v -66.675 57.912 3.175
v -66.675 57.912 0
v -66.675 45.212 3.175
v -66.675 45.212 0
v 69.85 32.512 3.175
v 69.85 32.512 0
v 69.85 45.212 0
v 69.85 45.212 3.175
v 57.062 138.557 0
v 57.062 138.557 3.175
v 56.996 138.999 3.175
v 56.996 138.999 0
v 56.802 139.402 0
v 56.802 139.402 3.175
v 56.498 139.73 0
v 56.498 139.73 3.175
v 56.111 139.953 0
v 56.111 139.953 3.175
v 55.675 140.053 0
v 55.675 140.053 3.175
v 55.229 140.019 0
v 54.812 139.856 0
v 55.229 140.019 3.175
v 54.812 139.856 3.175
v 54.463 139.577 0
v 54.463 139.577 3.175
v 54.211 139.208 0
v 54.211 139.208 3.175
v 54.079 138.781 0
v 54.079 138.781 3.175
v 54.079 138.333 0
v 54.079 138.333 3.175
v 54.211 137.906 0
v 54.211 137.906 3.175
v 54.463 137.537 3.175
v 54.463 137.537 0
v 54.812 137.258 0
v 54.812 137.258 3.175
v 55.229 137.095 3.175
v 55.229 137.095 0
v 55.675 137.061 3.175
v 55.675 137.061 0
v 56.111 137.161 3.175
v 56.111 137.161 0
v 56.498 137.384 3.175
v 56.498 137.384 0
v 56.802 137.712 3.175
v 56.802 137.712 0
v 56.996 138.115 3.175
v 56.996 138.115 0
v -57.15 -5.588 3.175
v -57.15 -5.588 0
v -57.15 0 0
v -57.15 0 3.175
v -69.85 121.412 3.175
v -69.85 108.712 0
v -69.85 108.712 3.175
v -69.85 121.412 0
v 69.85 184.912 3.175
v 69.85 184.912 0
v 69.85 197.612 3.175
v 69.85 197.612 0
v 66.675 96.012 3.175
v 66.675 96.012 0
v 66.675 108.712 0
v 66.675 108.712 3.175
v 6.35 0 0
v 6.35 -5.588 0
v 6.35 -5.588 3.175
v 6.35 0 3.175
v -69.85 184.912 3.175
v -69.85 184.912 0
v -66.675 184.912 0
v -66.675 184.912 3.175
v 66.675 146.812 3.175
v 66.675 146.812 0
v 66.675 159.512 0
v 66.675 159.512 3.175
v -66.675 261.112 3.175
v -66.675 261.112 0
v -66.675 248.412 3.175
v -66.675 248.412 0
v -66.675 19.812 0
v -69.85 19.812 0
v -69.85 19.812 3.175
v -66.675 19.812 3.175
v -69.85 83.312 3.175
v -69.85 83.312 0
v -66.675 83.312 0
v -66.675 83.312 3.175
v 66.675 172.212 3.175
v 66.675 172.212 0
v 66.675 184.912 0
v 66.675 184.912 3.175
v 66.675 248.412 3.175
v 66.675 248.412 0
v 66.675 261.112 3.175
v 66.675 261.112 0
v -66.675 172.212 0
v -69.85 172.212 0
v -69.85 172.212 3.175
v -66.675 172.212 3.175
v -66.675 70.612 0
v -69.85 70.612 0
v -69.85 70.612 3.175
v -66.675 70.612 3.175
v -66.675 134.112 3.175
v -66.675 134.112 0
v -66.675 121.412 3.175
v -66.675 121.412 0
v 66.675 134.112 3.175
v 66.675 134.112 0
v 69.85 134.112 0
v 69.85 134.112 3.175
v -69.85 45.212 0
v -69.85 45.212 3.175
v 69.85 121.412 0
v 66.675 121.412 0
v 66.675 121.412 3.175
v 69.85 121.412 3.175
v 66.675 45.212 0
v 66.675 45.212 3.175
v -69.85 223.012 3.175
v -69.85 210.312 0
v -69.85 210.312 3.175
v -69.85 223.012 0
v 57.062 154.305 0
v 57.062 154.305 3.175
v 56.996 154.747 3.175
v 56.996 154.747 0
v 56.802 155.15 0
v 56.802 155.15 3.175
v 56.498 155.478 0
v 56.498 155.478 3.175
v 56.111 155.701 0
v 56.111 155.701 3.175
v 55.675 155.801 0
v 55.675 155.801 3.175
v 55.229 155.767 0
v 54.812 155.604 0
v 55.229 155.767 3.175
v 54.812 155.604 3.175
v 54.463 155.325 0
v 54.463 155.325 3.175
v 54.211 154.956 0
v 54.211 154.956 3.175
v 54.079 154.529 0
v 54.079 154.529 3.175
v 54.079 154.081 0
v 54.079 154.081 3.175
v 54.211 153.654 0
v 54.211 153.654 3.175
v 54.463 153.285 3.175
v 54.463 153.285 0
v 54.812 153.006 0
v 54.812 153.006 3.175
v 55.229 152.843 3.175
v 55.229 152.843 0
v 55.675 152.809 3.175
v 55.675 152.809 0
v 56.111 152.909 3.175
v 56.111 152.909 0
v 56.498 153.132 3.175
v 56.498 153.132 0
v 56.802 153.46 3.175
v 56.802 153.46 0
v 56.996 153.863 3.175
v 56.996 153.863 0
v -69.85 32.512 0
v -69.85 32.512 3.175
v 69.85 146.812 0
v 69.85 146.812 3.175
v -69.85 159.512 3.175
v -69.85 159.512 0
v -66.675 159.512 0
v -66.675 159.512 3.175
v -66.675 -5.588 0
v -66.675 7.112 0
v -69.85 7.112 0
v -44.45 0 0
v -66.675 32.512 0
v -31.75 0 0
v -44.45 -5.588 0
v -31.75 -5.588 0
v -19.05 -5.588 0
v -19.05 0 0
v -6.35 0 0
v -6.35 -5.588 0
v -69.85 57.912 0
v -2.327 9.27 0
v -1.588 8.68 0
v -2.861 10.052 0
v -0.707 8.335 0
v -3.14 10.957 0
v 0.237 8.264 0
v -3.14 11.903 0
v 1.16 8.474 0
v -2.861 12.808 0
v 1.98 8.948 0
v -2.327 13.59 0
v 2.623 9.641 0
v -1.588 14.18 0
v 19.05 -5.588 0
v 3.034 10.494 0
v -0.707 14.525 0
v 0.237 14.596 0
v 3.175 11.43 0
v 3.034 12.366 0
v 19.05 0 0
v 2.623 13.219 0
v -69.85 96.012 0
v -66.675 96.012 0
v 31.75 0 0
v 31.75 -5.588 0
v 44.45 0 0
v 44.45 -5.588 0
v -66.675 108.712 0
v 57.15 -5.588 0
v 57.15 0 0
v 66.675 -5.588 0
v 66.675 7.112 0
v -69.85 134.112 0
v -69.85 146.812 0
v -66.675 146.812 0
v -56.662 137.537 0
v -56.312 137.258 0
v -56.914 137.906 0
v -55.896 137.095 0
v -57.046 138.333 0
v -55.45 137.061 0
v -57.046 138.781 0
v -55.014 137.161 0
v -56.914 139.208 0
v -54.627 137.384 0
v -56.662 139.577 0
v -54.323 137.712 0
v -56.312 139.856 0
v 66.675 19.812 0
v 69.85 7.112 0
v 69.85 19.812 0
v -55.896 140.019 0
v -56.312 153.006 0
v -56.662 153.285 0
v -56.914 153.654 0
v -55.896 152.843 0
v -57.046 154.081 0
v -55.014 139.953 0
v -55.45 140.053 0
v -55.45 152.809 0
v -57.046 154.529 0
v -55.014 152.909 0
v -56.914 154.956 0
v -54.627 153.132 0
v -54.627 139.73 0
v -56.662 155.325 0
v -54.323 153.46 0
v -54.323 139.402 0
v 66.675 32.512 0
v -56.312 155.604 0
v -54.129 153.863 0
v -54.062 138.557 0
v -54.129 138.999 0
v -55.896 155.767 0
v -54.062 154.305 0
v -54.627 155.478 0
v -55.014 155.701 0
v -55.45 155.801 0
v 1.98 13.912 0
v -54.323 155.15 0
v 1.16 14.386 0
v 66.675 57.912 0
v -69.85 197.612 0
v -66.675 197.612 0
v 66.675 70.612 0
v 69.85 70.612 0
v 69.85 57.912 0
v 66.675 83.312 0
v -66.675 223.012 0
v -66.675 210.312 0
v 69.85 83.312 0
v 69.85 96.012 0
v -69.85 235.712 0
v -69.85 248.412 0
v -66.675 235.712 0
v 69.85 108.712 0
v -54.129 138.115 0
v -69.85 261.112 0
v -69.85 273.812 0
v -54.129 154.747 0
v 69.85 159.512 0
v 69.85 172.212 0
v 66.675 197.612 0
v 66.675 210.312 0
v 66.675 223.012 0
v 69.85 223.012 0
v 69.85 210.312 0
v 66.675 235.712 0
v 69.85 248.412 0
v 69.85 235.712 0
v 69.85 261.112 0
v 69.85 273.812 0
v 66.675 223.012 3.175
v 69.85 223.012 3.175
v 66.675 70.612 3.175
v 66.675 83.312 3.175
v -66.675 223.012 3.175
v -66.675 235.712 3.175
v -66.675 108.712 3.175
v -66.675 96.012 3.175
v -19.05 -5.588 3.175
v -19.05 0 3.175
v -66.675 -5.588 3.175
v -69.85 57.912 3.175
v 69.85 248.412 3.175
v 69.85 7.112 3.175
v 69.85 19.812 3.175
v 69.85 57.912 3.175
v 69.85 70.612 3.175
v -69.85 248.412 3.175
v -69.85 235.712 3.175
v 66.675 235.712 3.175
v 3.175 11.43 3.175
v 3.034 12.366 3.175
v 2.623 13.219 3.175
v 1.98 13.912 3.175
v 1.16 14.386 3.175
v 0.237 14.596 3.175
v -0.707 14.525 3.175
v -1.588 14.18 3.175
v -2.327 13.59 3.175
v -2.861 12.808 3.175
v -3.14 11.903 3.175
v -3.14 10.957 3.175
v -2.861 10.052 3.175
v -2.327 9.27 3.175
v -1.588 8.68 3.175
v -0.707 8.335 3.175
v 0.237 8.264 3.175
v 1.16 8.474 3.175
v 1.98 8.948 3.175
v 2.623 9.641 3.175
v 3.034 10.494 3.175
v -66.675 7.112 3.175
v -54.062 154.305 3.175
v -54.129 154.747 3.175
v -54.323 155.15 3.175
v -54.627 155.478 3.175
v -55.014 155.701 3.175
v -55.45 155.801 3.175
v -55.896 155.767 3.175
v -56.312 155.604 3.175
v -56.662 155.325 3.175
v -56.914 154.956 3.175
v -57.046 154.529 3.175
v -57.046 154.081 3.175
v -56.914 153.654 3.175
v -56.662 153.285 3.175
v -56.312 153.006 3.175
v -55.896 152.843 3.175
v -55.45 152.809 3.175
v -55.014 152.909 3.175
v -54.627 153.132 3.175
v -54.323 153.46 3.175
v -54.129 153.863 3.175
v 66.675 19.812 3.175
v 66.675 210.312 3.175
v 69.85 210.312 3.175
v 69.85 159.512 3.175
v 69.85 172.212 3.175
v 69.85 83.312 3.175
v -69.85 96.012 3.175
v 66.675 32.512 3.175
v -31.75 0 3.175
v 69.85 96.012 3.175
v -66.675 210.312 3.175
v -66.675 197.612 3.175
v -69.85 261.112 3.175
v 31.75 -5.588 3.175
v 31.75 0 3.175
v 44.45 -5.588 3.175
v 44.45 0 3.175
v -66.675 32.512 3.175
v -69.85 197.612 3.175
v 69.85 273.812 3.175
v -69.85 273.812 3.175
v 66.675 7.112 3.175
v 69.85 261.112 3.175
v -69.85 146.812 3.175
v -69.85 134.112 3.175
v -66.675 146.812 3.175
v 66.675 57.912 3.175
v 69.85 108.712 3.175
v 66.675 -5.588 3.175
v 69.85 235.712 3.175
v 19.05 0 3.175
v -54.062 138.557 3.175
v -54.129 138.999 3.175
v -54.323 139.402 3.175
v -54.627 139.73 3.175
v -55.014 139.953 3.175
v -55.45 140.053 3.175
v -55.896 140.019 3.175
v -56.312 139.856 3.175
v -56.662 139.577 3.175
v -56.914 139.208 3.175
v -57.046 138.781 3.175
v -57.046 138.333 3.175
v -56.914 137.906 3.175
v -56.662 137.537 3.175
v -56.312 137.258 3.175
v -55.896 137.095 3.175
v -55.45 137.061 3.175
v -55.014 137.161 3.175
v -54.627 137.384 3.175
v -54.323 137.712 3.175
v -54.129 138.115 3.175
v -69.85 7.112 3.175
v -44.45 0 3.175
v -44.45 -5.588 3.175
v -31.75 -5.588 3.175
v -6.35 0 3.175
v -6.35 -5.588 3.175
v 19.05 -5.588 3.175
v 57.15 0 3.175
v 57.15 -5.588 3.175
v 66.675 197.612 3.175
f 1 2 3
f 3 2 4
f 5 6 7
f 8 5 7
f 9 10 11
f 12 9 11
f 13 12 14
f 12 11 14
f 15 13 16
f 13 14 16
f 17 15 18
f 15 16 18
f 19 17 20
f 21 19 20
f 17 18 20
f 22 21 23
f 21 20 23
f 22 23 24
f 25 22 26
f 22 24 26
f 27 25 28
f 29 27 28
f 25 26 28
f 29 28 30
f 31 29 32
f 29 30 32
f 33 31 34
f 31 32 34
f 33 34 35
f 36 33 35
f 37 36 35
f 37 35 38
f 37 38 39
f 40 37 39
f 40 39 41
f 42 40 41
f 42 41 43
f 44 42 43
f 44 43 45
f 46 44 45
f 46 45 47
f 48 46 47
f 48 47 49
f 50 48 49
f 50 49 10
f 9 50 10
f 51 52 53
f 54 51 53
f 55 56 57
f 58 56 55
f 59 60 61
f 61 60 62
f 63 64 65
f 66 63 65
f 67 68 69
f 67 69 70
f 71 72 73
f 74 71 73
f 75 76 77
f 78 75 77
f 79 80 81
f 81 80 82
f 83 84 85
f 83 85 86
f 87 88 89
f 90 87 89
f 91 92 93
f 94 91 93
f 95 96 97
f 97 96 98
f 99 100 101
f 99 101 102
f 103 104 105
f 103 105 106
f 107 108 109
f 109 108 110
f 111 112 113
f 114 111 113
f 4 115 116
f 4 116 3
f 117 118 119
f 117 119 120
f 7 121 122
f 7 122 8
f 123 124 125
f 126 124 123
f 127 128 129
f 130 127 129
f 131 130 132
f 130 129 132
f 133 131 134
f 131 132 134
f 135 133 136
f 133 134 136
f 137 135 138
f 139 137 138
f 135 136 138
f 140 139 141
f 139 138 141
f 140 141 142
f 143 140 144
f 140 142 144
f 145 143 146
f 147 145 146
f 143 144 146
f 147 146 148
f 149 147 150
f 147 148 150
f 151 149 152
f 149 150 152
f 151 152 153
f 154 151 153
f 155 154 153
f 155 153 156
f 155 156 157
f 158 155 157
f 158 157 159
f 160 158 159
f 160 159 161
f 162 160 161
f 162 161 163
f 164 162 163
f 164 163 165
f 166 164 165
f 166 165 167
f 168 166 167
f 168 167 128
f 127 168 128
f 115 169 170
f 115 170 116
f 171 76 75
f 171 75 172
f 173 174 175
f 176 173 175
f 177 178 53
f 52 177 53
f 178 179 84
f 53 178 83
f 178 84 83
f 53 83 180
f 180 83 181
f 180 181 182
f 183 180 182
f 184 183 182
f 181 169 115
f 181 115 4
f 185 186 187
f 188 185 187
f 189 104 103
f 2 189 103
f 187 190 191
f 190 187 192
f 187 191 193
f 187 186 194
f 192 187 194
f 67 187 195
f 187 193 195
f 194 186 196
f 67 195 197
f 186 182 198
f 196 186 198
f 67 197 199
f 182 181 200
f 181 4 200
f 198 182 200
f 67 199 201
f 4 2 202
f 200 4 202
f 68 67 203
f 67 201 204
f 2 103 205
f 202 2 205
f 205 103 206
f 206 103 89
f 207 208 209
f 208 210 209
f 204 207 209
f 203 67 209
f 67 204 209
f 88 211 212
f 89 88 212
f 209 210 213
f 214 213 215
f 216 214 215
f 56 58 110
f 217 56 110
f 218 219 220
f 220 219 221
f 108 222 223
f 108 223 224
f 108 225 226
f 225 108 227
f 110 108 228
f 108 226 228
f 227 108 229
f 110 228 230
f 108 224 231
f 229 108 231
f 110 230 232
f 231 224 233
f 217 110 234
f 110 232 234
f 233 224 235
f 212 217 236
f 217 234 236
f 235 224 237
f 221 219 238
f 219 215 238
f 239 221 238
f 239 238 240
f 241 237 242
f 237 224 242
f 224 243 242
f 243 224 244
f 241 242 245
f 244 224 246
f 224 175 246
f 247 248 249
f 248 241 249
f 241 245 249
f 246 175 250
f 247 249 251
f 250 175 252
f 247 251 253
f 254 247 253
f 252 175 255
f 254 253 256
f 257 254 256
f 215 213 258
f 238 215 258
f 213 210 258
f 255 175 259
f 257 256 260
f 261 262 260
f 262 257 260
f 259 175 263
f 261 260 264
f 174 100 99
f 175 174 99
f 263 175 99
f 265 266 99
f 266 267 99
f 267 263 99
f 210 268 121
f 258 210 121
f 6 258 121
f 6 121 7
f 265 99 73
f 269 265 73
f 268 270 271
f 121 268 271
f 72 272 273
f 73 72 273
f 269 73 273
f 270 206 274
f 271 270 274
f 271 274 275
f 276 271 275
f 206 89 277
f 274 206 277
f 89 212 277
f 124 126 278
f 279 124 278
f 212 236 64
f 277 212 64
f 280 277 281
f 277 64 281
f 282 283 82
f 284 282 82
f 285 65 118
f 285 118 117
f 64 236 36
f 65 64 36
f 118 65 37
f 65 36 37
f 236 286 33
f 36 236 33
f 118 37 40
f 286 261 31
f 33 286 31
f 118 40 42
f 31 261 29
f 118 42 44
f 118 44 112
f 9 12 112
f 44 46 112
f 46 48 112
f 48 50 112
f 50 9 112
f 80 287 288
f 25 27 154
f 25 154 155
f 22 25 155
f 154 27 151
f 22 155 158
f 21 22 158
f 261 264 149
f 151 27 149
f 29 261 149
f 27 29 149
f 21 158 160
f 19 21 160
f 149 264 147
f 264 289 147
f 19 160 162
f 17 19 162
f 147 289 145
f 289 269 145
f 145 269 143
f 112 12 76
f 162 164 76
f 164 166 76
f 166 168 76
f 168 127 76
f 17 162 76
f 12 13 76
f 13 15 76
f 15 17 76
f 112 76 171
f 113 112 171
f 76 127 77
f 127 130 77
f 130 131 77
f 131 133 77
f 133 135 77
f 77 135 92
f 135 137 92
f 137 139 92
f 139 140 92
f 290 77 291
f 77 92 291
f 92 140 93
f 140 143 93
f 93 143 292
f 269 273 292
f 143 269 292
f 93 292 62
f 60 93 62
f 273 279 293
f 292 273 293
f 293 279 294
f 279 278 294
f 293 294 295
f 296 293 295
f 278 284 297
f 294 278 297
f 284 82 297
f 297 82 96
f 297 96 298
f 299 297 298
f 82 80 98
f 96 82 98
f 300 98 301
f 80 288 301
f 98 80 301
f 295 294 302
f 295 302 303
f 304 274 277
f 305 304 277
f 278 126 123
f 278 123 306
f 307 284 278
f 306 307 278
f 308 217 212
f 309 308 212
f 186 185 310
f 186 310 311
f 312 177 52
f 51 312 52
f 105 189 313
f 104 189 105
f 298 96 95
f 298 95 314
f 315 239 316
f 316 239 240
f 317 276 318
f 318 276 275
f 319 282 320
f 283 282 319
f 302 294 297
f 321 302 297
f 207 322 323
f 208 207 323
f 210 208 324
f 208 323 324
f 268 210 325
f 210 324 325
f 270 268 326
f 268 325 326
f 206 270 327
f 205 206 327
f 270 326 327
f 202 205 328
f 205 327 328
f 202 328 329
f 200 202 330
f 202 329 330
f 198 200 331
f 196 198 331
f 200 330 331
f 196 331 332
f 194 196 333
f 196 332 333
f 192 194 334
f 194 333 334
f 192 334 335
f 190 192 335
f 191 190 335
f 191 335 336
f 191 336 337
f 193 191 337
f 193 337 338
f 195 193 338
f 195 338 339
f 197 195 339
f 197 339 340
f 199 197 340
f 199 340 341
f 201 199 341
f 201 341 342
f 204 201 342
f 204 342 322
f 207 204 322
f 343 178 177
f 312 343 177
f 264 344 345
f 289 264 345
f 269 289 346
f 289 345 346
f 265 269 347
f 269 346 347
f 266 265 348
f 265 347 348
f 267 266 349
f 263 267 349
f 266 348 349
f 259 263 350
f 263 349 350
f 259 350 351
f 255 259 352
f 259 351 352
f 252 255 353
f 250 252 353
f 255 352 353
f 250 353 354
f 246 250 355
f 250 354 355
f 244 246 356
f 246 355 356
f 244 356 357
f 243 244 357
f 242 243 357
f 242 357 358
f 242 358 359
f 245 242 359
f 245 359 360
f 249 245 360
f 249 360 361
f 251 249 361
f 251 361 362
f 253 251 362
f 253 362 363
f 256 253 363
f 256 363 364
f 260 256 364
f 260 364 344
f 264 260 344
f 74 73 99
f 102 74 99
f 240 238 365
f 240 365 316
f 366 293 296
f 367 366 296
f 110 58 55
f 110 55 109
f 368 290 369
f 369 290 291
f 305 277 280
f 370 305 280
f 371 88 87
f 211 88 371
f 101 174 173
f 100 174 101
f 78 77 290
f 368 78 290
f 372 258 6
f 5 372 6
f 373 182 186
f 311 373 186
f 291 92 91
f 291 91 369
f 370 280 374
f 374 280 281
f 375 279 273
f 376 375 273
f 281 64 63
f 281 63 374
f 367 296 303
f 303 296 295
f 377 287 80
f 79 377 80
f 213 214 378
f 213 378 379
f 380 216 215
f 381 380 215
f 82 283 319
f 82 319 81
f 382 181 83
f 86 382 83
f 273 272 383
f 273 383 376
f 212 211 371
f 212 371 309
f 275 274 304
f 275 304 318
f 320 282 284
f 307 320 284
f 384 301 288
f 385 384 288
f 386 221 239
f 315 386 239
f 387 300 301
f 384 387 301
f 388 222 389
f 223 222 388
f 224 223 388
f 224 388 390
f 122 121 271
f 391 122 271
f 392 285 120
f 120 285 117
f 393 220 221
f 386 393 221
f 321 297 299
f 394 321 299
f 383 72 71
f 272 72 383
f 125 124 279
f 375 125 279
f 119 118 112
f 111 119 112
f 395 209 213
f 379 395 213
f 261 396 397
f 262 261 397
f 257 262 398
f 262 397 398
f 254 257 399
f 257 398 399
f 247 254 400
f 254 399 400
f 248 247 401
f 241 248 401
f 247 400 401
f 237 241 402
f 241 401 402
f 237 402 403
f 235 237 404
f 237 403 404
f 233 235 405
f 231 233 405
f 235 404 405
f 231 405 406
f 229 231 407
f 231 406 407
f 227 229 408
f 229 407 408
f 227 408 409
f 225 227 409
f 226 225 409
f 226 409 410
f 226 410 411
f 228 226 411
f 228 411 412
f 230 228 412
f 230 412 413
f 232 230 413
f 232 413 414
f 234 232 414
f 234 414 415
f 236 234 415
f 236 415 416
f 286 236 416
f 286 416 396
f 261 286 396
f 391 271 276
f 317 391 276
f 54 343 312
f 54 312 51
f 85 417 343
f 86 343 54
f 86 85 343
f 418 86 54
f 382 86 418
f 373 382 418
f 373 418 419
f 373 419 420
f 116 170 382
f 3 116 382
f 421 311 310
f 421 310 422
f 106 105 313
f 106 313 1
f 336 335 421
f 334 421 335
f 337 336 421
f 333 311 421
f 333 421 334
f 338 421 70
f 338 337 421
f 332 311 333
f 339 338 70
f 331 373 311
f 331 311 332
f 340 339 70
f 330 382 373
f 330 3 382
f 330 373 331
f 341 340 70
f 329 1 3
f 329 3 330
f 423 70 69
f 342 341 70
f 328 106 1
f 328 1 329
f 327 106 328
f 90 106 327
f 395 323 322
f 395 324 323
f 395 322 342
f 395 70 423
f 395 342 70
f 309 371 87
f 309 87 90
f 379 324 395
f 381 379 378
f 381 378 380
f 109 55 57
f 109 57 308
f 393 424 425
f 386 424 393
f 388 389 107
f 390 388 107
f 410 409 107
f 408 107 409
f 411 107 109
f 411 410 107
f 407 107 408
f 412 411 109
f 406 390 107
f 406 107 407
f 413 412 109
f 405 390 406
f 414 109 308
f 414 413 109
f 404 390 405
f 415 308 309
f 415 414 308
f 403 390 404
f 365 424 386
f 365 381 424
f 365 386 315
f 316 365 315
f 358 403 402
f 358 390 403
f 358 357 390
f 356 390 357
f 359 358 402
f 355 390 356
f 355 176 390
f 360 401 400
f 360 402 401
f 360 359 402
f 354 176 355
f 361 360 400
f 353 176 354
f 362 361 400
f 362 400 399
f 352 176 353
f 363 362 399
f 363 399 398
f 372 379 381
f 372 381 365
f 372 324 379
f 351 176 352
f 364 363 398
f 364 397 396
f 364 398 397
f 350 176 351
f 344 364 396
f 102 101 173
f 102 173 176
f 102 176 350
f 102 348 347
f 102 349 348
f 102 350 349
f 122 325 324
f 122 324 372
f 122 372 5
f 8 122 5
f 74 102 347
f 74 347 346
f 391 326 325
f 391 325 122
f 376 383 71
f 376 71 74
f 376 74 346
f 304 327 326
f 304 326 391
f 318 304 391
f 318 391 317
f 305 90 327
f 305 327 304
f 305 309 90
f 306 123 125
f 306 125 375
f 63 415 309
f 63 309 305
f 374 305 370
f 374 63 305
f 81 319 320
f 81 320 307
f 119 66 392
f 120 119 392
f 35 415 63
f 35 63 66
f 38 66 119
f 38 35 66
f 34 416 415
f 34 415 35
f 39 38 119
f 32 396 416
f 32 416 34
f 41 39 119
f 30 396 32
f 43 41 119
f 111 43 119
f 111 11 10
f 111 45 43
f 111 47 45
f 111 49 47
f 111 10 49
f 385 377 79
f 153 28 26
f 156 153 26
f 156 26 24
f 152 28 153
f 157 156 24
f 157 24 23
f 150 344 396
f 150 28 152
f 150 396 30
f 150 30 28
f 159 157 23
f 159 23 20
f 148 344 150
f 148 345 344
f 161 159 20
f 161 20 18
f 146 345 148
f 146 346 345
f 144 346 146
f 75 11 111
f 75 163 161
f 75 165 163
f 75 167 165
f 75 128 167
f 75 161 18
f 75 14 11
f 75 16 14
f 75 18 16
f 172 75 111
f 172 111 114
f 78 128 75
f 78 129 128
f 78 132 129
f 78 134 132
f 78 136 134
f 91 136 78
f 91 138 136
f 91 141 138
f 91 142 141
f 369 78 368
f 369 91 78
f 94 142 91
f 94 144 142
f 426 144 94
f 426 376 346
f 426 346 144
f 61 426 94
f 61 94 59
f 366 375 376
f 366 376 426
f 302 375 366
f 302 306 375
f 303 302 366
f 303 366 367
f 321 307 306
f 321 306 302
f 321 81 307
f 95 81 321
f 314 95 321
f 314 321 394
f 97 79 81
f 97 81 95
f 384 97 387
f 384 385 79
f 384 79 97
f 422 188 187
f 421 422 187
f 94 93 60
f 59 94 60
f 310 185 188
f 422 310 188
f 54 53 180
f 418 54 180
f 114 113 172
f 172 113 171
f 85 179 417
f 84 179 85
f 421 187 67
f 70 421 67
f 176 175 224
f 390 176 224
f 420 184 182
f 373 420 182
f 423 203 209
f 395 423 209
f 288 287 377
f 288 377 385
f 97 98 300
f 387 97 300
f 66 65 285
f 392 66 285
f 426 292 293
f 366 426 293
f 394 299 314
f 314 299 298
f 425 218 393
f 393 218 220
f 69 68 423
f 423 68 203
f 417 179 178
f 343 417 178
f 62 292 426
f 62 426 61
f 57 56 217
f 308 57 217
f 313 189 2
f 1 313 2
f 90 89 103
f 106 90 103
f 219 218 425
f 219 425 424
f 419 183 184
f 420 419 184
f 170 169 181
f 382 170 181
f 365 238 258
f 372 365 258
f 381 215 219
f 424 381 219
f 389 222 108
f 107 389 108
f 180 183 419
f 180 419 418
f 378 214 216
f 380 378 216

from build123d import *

# Parameters (mm, degrees)
SKETCH1_W           = 3.175
SKETCH1_H           = 12.7
SKETCH1_W_2         = 9.525
SKETCH1_H_2         = 5.588
SKETCH1_W_3         = 12.7
BOSS_EXTRUDE1_DEPTH = 3.175
SKETCH2_R           = 3.175
CUT_EXTRUDE1_DEPTH  = 4.175
SKETCH3_R           = 1.5
CUT_EXTRUDE2_DEPTH  = 4.175


with BuildPart() as part:
    # Sketch1 → Boss-Extrude1 (new body)
    with BuildSketch(Plane.XY):
        Polygon((-66.675, 273.812), (-66.675, 261.112), (-66.675, 248.412), (-66.675, 235.712), (-66.675, 223.012), (-66.675, 210.312), (-66.675, 197.612), (-66.675, 184.912), (-66.675, 172.212), (-66.675, 159.512), (-66.675, 146.812), (-66.675, 134.112), (-66.675, 121.412), (-66.675, 108.712), (-66.675, 96.012), (-66.675, 83.312), (-66.675, 70.612), (-66.675, 57.912), (-66.675, 45.212), (-66.675, 32.512), (-66.675, 19.812), (-66.675, 7.112), (-66.675, 0), (-57.15, 0), (-44.45, 0), (-31.75, 0), (-19.05, 0), (-6.35, 0), (6.35, 0), (19.05, 0), (31.75, 0), (44.45, 0), (57.15, 0), (66.675, 0), (66.675, 7.112), (66.675, 19.812), (66.675, 32.512), (66.675, 45.212), (66.675, 57.912), (66.675, 70.612), (66.675, 83.312), (66.675, 96.012), (66.675, 108.712), (66.675, 121.412), (66.675, 134.112), (66.675, 146.812), (66.675, 159.512), (66.675, 172.212), (66.675, 184.912), (66.675, 197.612), (66.675, 210.312), (66.675, 223.012), (66.675, 235.712), (66.675, 248.412), (66.675, 261.112), (66.675, 273.812), align=None)
        with Locations((-68.2625, 13.462)):
            Rectangle(SKETCH1_W, SKETCH1_H)
        with Locations((-68.2625, 38.862)):
            Rectangle(SKETCH1_W, SKETCH1_H)
        with Locations((-68.2625, 64.262)):
            Rectangle(SKETCH1_W, SKETCH1_H)
        with Locations((-68.2625, 89.662)):
            Rectangle(SKETCH1_W, SKETCH1_H)
        with Locations((-61.9125, -2.794)):
            Rectangle(SKETCH1_W_2, SKETCH1_H_2)
        with Locations((-38.1, -2.794)):
            Rectangle(SKETCH1_W_3, SKETCH1_H_2)
        with Locations((-12.7, -2.794)):
            Rectangle(SKETCH1_W_3, SKETCH1_H_2)
        with Locations((12.7, -2.794)):
            Rectangle(SKETCH1_W_3, SKETCH1_H_2)
        with Locations((38.1, -2.794)):
            Rectangle(SKETCH1_W_3, SKETCH1_H_2)
        with Locations((61.9125, -2.794)):
            Rectangle(SKETCH1_W_2, SKETCH1_H_2)
        with Locations((68.2625, 13.462)):
            Rectangle(SKETCH1_W, SKETCH1_H)
        with Locations((68.2625, 38.862)):
            Rectangle(SKETCH1_W, SKETCH1_H)
        with Locations((68.2625, 64.262)):
            Rectangle(SKETCH1_W, SKETCH1_H)
        with Locations((68.2625, 89.662)):
            Rectangle(SKETCH1_W, SKETCH1_H)
        with Locations((68.2625, 115.062)):
            Rectangle(SKETCH1_W, SKETCH1_H)
        with Locations((-68.2625, 115.062)):
            Rectangle(SKETCH1_W, SKETCH1_H)
        with Locations((-68.2625, 140.462)):
            Rectangle(SKETCH1_W, SKETCH1_H)
        with Locations((-68.2625, 165.862)):
            Rectangle(SKETCH1_W, SKETCH1_H)
        with Locations((-68.2625, 191.262)):
            Rectangle(SKETCH1_W, SKETCH1_H)
        with Locations((-68.2625, 216.662)):
            Rectangle(SKETCH1_W, SKETCH1_H)
        with Locations((-68.2625, 242.062)):
            Rectangle(SKETCH1_W, SKETCH1_H)
        with Locations((-68.2625, 267.462)):
            Rectangle(SKETCH1_W, SKETCH1_H)
        with Locations((68.2625, 140.462)):
            Rectangle(SKETCH1_W, SKETCH1_H)
        with Locations((68.2625, 165.862)):
            Rectangle(SKETCH1_W, SKETCH1_H)
        with Locations((68.2625, 191.262)):
            Rectangle(SKETCH1_W, SKETCH1_H)
        with Locations((68.2625, 216.662)):
            Rectangle(SKETCH1_W, SKETCH1_H)
        with Locations((68.2625, 242.062)):
            Rectangle(SKETCH1_W, SKETCH1_H)
        with Locations((68.2625, 267.462)):
            Rectangle(SKETCH1_W, SKETCH1_H)
    extrude(amount=BOSS_EXTRUDE1_DEPTH)

    # Sketch2 → Cut-Extrude1 (cut, through all)
    with BuildSketch(Plane.XY.offset(3.175)):
        with Locations((0, 11.43)):
            Circle(SKETCH2_R)
    extrude(amount=-CUT_EXTRUDE1_DEPTH, mode=Mode.SUBTRACT)

    # Sketch3 → Cut-Extrude2 (cut, through all)
    with BuildSketch(Plane.XY.offset(3.175)):
        with Locations((-55.5625, 154.305)):
            Circle(SKETCH3_R)
        with Locations((-55.5625, 138.557)):
            Circle(SKETCH3_R)
        with Locations((55.5625, 154.305)):
            Circle(SKETCH3_R)
        with Locations((55.5625, 138.557)):
            Circle(SKETCH3_R)
    extrude(amount=-CUT_EXTRUDE2_DEPTH, mode=Mode.SUBTRACT)


solid = part.part
